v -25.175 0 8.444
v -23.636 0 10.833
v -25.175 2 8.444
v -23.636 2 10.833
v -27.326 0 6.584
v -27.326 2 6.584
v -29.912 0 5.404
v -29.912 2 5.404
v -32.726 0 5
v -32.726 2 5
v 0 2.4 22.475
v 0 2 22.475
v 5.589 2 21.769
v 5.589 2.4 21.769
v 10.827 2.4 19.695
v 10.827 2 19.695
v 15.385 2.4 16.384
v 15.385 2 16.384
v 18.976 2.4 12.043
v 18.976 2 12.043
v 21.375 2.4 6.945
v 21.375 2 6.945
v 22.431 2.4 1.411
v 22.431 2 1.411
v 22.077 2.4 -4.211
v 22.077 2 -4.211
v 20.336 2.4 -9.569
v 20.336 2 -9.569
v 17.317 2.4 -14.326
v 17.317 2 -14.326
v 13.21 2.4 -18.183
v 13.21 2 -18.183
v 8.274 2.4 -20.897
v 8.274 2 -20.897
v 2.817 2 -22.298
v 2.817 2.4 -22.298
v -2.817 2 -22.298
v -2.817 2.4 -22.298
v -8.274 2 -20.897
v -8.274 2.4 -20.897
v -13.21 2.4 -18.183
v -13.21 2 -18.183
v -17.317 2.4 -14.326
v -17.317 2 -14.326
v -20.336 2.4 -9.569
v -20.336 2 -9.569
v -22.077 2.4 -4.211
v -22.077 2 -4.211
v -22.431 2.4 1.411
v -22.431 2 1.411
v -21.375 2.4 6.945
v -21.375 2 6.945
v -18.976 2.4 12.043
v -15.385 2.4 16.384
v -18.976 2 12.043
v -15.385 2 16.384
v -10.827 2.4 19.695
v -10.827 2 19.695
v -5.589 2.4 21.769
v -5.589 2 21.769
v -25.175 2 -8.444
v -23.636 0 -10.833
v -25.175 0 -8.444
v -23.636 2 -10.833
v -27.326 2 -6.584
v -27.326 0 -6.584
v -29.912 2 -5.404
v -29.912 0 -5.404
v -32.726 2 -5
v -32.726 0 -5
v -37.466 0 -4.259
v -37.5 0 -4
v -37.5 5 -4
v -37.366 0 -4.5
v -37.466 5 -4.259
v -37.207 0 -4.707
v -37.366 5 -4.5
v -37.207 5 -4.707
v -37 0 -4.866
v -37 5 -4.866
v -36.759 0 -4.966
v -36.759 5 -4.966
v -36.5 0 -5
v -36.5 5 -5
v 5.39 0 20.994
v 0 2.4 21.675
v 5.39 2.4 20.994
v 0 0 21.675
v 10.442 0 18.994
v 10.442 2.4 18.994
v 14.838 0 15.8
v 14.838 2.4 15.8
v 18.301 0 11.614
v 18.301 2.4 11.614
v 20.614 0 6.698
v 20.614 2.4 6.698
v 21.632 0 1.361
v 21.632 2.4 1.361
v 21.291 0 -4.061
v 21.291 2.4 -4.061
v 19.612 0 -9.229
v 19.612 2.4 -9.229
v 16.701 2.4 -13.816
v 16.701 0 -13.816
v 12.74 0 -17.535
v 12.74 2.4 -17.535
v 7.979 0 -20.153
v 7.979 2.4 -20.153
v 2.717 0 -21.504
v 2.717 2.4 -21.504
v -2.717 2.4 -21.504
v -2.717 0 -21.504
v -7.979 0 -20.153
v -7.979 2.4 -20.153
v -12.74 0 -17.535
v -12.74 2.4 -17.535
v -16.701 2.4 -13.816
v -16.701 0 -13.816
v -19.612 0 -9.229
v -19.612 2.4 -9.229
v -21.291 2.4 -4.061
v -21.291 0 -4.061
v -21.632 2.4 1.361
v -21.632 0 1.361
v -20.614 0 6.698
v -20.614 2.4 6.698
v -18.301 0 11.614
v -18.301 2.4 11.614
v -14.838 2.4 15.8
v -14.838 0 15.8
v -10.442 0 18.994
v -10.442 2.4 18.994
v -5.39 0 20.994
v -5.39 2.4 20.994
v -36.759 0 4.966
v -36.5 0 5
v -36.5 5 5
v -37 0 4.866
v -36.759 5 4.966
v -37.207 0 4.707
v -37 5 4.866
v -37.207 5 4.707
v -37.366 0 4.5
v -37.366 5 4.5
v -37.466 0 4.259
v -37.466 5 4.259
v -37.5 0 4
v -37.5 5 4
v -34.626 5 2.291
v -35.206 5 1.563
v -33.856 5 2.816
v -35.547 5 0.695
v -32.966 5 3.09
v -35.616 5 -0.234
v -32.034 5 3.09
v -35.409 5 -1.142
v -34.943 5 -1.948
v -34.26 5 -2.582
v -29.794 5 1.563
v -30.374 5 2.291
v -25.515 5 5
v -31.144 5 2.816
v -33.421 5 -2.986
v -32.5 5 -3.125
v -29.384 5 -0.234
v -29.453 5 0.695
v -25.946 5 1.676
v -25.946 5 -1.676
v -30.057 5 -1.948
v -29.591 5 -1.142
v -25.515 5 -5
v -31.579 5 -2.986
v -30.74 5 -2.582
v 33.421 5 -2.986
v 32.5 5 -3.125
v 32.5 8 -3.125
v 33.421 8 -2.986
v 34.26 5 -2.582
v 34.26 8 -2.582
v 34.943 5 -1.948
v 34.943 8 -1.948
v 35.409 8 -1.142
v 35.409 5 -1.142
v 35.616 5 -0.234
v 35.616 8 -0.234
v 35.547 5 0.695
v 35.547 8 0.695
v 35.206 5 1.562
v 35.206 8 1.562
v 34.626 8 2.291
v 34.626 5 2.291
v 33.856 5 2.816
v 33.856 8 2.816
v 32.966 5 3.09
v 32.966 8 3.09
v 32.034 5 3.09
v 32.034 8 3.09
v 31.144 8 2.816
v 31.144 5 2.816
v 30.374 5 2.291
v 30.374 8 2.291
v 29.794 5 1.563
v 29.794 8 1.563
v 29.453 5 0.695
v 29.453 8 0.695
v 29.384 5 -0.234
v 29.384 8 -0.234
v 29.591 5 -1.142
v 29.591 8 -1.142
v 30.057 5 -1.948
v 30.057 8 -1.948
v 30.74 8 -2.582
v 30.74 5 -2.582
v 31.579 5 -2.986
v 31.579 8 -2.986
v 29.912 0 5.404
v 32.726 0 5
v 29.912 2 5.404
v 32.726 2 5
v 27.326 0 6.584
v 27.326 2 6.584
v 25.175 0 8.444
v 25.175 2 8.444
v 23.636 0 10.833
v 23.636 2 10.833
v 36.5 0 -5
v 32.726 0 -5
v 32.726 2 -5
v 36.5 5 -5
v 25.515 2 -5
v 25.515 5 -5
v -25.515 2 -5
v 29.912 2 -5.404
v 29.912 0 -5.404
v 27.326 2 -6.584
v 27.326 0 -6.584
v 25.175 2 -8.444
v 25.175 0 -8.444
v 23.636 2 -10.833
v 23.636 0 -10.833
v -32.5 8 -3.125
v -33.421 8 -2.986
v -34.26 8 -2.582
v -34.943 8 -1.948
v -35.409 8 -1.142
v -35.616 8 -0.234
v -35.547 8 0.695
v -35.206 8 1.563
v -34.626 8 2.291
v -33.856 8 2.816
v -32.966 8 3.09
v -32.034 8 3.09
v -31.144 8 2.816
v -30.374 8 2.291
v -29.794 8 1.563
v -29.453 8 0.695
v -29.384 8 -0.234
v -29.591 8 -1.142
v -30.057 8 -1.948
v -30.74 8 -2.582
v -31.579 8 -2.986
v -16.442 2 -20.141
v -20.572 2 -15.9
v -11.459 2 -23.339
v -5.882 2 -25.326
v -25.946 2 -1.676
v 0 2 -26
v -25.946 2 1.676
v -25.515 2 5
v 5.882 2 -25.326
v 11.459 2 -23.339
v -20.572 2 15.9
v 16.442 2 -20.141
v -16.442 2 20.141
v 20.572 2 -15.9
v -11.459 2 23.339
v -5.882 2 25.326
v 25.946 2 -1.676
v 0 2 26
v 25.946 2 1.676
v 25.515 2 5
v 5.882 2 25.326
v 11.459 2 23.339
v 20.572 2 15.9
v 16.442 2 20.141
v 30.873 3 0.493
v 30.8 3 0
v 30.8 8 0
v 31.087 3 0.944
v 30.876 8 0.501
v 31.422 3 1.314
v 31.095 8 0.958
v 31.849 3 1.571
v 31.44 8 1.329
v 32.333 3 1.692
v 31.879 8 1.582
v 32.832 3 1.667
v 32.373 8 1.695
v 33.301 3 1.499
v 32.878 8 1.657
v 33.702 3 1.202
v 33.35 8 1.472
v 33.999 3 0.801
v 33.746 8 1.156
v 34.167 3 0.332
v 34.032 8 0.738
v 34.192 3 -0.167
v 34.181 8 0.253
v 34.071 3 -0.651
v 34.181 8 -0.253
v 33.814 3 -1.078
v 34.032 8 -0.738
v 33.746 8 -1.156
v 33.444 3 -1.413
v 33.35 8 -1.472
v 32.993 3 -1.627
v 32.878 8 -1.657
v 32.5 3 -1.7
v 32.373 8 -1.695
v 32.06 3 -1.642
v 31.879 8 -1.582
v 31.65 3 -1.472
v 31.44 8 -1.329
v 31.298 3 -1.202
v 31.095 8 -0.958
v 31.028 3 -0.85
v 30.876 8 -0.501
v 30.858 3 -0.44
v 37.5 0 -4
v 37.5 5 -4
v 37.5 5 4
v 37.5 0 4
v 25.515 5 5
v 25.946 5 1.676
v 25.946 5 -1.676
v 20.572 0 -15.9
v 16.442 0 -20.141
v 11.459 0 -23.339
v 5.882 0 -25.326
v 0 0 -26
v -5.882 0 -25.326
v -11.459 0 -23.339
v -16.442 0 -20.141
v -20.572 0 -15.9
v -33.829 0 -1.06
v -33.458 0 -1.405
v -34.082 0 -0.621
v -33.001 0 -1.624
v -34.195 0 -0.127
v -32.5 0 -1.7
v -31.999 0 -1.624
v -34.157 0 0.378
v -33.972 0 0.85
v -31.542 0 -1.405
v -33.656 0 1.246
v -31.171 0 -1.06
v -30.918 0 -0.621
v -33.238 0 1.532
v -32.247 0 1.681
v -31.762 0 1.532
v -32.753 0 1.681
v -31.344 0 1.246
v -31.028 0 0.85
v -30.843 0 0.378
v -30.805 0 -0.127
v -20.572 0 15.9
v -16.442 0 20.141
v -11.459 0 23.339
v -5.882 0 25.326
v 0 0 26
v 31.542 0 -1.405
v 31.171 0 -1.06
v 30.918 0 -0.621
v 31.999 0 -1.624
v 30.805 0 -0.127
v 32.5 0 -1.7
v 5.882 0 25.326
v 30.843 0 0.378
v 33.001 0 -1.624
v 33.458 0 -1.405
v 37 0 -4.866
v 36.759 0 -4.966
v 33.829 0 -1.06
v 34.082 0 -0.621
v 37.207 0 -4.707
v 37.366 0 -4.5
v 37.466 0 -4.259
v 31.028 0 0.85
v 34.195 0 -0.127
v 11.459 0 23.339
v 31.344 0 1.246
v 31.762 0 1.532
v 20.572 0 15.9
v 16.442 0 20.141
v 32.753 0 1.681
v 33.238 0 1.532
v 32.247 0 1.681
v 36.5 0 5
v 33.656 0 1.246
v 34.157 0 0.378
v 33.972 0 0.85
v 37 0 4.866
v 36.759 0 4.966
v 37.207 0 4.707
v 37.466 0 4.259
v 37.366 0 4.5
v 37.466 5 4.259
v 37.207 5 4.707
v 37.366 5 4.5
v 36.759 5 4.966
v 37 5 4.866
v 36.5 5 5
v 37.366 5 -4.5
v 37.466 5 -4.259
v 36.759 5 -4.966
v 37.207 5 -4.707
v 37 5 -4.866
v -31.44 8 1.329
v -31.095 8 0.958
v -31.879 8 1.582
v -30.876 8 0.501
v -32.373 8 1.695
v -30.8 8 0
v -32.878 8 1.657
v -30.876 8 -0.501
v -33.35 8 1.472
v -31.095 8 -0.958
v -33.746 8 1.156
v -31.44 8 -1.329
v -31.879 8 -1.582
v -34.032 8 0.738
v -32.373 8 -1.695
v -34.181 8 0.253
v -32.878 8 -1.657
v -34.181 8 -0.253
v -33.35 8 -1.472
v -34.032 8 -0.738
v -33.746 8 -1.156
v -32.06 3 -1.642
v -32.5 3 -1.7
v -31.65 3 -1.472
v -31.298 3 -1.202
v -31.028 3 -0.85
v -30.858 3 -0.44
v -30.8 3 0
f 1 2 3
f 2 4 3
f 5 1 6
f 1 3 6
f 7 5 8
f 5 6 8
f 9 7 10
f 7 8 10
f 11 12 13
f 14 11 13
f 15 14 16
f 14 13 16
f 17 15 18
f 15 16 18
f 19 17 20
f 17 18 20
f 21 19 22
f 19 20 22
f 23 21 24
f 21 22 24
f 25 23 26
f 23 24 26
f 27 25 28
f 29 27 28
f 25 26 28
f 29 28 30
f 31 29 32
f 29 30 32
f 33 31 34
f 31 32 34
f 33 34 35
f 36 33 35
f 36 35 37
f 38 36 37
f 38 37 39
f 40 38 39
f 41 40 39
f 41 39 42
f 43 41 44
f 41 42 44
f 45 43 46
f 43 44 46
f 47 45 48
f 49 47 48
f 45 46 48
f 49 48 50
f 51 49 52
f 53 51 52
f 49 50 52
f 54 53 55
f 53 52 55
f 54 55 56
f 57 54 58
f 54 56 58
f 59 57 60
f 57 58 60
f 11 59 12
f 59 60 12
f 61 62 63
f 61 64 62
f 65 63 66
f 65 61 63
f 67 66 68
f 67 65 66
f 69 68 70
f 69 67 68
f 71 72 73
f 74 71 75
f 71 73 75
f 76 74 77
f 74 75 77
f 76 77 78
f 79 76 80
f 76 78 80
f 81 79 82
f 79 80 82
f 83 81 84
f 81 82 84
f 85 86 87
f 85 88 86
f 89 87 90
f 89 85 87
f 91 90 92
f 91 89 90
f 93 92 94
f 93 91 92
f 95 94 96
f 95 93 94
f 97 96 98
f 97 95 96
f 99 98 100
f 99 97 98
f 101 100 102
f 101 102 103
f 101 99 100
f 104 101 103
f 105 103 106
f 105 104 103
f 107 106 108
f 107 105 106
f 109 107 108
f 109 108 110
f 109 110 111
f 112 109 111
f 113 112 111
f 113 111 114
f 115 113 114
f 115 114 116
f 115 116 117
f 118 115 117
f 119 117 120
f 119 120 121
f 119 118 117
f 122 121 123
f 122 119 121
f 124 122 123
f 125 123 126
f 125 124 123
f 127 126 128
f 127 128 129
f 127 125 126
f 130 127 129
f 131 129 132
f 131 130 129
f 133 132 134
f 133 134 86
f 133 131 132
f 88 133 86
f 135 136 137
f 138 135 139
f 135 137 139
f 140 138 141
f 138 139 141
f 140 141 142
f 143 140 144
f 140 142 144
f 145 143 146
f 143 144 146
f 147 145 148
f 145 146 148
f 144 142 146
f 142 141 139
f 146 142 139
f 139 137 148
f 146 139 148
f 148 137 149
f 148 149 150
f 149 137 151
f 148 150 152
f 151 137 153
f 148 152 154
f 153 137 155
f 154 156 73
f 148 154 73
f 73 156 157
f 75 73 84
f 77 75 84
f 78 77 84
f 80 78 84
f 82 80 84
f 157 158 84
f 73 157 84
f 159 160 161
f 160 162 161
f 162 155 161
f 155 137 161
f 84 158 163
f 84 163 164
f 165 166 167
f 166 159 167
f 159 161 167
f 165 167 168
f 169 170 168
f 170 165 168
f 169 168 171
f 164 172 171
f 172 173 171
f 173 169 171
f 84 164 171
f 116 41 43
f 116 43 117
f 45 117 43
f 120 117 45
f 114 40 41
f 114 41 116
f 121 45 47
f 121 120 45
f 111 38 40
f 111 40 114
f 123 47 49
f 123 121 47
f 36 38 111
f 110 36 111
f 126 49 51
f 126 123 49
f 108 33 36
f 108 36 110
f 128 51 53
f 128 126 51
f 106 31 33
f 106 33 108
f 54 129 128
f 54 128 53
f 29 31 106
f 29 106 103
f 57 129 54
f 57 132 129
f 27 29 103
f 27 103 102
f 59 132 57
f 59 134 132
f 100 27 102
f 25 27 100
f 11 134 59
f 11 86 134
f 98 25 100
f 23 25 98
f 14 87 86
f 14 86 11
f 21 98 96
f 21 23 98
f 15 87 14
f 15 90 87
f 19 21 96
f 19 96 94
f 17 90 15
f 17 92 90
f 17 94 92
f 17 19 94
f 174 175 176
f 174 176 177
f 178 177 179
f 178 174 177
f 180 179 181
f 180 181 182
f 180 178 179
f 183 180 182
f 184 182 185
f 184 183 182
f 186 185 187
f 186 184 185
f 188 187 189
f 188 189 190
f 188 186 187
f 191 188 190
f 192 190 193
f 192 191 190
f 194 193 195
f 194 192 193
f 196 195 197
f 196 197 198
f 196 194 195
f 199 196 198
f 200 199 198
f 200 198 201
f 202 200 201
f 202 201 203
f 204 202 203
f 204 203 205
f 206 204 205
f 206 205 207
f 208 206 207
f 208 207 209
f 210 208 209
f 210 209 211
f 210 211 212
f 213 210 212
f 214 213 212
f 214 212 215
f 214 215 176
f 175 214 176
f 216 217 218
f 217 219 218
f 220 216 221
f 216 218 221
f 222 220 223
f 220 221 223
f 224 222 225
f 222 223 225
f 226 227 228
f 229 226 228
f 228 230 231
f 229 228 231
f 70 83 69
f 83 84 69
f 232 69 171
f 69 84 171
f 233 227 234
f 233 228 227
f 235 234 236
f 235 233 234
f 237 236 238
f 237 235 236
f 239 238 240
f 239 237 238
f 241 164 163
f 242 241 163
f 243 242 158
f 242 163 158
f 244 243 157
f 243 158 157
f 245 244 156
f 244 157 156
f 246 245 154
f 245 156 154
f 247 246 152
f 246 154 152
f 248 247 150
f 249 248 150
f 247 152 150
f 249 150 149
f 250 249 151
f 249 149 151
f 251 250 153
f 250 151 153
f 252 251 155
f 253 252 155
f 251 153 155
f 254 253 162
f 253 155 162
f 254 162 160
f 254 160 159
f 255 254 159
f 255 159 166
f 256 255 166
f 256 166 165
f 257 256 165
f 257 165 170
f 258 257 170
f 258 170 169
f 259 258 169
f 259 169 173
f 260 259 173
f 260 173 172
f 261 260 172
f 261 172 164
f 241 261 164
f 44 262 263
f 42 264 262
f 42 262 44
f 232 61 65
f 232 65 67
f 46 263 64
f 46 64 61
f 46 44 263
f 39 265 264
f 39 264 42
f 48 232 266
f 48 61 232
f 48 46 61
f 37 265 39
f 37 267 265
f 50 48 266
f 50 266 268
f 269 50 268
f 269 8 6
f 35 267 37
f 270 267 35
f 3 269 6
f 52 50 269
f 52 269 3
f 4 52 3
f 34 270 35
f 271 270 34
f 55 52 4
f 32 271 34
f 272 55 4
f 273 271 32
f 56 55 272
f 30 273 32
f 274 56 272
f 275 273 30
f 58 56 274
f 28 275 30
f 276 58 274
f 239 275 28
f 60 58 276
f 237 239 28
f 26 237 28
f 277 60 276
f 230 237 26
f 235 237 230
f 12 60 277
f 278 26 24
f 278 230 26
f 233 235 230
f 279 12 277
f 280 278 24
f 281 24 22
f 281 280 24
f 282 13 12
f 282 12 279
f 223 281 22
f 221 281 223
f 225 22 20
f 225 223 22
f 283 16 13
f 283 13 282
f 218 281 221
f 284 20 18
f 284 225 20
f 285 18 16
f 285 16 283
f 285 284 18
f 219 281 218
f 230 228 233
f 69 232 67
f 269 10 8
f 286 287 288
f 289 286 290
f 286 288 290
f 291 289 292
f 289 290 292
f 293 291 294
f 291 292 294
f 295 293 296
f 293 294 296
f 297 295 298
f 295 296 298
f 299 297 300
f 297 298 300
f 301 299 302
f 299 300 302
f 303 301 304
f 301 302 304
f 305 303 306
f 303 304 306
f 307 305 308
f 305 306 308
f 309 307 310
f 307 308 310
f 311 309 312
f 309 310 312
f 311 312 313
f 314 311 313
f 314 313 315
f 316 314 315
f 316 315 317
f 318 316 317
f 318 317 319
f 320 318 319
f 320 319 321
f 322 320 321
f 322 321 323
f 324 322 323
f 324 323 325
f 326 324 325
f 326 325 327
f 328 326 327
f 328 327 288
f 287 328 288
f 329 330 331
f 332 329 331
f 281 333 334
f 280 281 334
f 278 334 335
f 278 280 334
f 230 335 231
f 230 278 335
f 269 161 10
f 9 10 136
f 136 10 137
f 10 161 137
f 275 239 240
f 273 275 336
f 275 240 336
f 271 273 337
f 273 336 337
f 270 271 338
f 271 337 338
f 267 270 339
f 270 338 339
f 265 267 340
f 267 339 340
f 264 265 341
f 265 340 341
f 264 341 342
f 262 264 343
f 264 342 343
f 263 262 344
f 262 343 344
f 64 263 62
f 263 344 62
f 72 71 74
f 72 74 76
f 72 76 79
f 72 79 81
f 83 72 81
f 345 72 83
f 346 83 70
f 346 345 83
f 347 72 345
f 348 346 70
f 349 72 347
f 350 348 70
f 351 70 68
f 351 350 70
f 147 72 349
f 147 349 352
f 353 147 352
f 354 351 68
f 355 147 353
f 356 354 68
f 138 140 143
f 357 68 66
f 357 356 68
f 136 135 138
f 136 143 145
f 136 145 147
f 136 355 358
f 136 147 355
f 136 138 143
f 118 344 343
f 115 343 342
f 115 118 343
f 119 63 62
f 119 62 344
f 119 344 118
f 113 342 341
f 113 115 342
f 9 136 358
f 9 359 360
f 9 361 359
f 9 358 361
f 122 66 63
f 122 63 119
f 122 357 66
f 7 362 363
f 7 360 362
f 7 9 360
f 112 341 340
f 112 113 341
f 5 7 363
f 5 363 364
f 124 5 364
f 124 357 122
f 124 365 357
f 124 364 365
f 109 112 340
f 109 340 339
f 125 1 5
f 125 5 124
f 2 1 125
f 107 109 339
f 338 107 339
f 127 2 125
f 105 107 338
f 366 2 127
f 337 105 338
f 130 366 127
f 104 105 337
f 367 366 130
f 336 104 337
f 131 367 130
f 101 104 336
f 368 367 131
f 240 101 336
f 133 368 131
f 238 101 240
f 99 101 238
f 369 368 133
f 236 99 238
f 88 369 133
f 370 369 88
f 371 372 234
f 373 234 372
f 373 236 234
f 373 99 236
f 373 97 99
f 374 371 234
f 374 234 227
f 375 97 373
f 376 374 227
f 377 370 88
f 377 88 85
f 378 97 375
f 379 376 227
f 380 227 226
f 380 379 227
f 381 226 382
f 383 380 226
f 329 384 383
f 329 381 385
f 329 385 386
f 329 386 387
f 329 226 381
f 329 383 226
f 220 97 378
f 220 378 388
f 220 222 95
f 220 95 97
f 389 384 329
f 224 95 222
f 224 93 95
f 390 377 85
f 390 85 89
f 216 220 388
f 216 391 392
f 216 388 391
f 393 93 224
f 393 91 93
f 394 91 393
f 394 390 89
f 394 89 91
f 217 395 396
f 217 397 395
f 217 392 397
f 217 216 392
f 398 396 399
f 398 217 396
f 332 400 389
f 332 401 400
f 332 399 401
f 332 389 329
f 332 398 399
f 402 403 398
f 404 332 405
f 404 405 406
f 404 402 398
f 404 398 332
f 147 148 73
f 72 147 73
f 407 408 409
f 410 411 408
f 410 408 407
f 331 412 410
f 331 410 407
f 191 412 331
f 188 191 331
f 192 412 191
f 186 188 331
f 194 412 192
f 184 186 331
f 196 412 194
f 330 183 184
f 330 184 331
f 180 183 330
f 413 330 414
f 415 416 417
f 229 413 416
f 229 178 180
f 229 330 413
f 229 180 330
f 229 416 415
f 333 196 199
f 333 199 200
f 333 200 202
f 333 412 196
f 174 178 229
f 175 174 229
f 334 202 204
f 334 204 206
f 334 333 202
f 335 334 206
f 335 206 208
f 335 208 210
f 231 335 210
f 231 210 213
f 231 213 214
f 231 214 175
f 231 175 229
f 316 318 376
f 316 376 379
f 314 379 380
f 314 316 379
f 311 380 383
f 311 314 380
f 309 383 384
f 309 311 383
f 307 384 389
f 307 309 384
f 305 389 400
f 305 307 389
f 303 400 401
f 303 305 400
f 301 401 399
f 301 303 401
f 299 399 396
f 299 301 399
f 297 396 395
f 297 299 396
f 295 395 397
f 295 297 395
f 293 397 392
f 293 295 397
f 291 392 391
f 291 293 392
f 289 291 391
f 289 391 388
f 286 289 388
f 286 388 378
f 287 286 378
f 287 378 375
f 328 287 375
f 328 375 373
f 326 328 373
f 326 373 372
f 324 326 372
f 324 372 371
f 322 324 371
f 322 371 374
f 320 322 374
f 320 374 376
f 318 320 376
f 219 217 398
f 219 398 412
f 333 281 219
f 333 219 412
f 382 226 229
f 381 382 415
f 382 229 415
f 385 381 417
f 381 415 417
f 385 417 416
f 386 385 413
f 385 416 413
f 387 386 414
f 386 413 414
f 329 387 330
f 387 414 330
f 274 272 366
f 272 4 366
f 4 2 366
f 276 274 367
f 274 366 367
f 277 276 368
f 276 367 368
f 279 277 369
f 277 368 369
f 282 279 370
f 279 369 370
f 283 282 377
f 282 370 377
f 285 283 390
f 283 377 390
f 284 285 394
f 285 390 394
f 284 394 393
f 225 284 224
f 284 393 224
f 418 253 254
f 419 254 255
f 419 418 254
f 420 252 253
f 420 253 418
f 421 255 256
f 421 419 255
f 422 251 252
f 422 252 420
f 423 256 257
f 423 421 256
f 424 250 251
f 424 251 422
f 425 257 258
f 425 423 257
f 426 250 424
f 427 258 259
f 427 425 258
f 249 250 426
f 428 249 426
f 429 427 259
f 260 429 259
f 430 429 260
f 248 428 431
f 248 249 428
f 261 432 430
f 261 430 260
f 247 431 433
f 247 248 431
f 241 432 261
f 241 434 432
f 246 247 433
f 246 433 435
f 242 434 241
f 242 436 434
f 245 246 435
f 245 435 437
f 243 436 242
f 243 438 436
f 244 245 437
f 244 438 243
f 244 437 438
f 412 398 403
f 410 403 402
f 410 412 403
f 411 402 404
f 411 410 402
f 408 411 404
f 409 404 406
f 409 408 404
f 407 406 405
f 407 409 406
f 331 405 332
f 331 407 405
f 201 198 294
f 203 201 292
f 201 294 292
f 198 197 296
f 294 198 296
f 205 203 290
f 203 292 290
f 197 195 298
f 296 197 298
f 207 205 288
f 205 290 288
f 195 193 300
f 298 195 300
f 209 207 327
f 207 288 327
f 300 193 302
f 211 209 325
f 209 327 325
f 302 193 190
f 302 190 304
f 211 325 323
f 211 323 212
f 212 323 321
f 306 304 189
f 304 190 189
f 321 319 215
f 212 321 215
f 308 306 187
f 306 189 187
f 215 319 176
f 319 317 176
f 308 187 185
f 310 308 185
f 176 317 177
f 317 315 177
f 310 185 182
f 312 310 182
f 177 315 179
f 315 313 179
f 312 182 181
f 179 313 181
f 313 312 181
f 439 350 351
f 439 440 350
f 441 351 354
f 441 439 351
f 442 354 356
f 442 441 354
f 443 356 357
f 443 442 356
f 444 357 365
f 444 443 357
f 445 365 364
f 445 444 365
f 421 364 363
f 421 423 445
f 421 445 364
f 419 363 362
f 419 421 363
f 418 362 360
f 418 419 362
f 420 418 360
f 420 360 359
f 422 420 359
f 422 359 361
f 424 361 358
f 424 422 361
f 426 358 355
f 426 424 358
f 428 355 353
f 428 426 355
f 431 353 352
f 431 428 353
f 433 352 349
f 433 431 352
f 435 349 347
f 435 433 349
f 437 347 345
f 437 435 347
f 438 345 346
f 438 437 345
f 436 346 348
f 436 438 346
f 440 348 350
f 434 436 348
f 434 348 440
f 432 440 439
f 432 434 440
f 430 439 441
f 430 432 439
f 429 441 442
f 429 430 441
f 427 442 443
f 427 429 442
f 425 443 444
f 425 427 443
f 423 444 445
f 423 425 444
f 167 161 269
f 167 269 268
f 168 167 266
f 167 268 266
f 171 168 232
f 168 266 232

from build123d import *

# Parameters (mm, degrees)
SKETCH1_R            = 26
SKETCH1_R_2          = 21.675
BOSS_EXTRUDE1_DEPTH  = 2
SKETCH2_R            = 22.475
SKETCH2_R_2          = 21.675
BOSS_EXTRUDE2_DEPTH  = 0.4
BOSS_EXTRUDE3_DEPTH  = 5
SKETCH4_W            = 10
SKETCH4_H            = 2
BOSS_EXTRUDE4_DEPTH  = 9.9853
SKETCH5_R            = 3.125
BOSS_EXTRUDE7_DEPTH  = 5
M3_CLEARANCE_HOLE1_D = 3.4
FILLET1_R            = 1
SKETCH9_R            = 1.7
BOSS_EXTRUDE8_DEPTH  = 3
FILLET3_R            = 10


with BuildPart() as part:
    # Sketch1 → Boss-Extrude1 (new body)
    with BuildSketch(Plane(origin=(0, 0, 0), x_dir=(1, 0, 0), z_dir=(0, 1, 0))):
        with Locations(Location((0, 0, 0), (0, 0, 270))):
            Circle(SKETCH1_R)
        with Locations(Location((0, 0, 0), (0, 0, 270))):
            Circle(SKETCH1_R_2, mode=Mode.SUBTRACT)
    extrude(amount=BOSS_EXTRUDE1_DEPTH)

    # Sketch2 → Boss-Extrude2 (add)
    with BuildSketch(Plane(origin=(0, 2, 0), x_dir=(1, 0, 0), z_dir=(0, 1, 0))):
        with Locations(Location((0, 0, 0), (0, 0, 270))):
            Circle(SKETCH2_R)
        with Locations(Location((0, 0, 0), (0, 0, 270))):
            Circle(SKETCH2_R_2, mode=Mode.SUBTRACT)
    extrude(amount=BOSS_EXTRUDE2_DEPTH)

    # Sketch3 → Boss-Extrude3 (add)
    with BuildSketch(Plane.XZ):
        with BuildLine():
            Line((25.514701644, -5), (27.514701644, -5))
            Line((27.514701644, -5), (27.514701644, 5))
            Line((27.514701644, 5), (25.514701644, 5))
            ThreePointArc((25.514701644, 5), (26, 0), (25.514701644, -5))
        make_face()
    boss_extrude3 = extrude(amount=-BOSS_EXTRUDE3_DEPTH)

    # Sketch4 → Boss-Extrude4 (add)
    with BuildSketch(Plane(origin=(27.514701644, 0, 0), x_dir=(0, 0, -1), z_dir=(1, 0, 0))):
        with Locations((0, 4)):
            Rectangle(SKETCH4_W, SKETCH4_H)
    boss_extrude4 = extrude(amount=BOSS_EXTRUDE4_DEPTH)

    # Sketch5 → Boss-Extrude7 (add)
    with BuildSketch(Plane.XZ.offset(-3)):
        with Locations(Location((32.500001644, 0, 0), (0, 0, 270))):
            Circle(SKETCH5_R)
    boss_extrude7 = extrude(amount=-BOSS_EXTRUDE7_DEPTH)

    # M3 Clearance Hole1 (through all)
    with Locations(Plane.XZ.offset(-3)):
        with Locations((32.500001644, 0)):
            m3_clearance_hole1 = Hole(M3_CLEARANCE_HOLE1_D / 2)

    # Mirror1: Boss-Extrude3, Boss-Extrude4, Boss-Extrude7, M3 Clearance Hole1 across plane
    add(boss_extrude3.mirror(Plane(origin=(0, 0, 0), x_dir=(0, 0, 1), z_dir=(1, 0, 0))))
    add(boss_extrude4.mirror(Plane(origin=(0, 0, 0), x_dir=(0, 0, 1), z_dir=(1, 0, 0))))
    add(boss_extrude7.mirror(Plane(origin=(0, 0, 0), x_dir=(0, 0, 1), z_dir=(1, 0, 0))))
    add(m3_clearance_hole1.mirror(Plane(origin=(0, 0, 0), x_dir=(0, 0, 1), z_dir=(1, 0, 0))), mode=Mode.SUBTRACT)

    # Fillet1
    fillet1_edges = [part.edges().sort_by_distance(p)[0] for p in [
        (37.500001644, 4, -5),
        (37.500001644, 4, 5),
        (-37.500001644, 4, -5),
        (-37.500001644, 4, 5),
    ]]
    fillet(fillet1_edges, radius=FILLET1_R)

    # Sketch9 → Boss-Extrude8 (add, through all)
    with BuildSketch(Plane.XZ.offset(-3)):
        with BuildLine():
            Line((-37.500001644, 4), (-37.500001644, -4))
            ThreePointArc((-37.500001644, -4), (-37.207108426, -4.707106781), (-36.500001644, -5))
            Line((-36.500001644, -5), (-27.514701644, -5))
            Line((-27.514701644, -5), (-27.514701644, 5))
            Line((-27.514701644, 5), (-36.500001644, 5))
            ThreePointArc((-36.500001644, 5), (-37.207108426, 4.707106781), (-37.500001644, 4))
        make_face()
        with Locations(Location((-32.500001644, 0, 0), (0, 0, 270))):
            Circle(SKETCH9_R, mode=Mode.SUBTRACT)
        with BuildLine():
            Line((37.500001644, -4), (37.500001644, 4))
            ThreePointArc((37.500001644, 4), (37.207108426, 4.707106781), (36.500001644, 5))
            Line((36.500001644, 5), (27.514701644, 5))
            Line((27.514701644, 5), (27.514701644, -5))
            Line((27.514701644, -5), (36.500001644, -5))
            ThreePointArc((36.500001644, -5), (37.207108426, -4.707106781), (37.500001644, -4))
        make_face()
        with Locations(Location((32.500001644, 0, 0), (0, 0, 270))):
            Circle(SKETCH9_R, mode=Mode.SUBTRACT)
    extrude(amount=BOSS_EXTRUDE8_DEPTH)

    # Fillet3
    fillet3_edges = [part.edges().sort_by_distance(p)[0] for p in [
        (25.514701644, 1, -5),
        (25.514701644, 1, 5),
        (-25.514701644, 1, 5),
        (-25.514701644, 1, -5),
    ]]
    fillet(fillet3_edges, radius=FILLET3_R)


solid = part.part
